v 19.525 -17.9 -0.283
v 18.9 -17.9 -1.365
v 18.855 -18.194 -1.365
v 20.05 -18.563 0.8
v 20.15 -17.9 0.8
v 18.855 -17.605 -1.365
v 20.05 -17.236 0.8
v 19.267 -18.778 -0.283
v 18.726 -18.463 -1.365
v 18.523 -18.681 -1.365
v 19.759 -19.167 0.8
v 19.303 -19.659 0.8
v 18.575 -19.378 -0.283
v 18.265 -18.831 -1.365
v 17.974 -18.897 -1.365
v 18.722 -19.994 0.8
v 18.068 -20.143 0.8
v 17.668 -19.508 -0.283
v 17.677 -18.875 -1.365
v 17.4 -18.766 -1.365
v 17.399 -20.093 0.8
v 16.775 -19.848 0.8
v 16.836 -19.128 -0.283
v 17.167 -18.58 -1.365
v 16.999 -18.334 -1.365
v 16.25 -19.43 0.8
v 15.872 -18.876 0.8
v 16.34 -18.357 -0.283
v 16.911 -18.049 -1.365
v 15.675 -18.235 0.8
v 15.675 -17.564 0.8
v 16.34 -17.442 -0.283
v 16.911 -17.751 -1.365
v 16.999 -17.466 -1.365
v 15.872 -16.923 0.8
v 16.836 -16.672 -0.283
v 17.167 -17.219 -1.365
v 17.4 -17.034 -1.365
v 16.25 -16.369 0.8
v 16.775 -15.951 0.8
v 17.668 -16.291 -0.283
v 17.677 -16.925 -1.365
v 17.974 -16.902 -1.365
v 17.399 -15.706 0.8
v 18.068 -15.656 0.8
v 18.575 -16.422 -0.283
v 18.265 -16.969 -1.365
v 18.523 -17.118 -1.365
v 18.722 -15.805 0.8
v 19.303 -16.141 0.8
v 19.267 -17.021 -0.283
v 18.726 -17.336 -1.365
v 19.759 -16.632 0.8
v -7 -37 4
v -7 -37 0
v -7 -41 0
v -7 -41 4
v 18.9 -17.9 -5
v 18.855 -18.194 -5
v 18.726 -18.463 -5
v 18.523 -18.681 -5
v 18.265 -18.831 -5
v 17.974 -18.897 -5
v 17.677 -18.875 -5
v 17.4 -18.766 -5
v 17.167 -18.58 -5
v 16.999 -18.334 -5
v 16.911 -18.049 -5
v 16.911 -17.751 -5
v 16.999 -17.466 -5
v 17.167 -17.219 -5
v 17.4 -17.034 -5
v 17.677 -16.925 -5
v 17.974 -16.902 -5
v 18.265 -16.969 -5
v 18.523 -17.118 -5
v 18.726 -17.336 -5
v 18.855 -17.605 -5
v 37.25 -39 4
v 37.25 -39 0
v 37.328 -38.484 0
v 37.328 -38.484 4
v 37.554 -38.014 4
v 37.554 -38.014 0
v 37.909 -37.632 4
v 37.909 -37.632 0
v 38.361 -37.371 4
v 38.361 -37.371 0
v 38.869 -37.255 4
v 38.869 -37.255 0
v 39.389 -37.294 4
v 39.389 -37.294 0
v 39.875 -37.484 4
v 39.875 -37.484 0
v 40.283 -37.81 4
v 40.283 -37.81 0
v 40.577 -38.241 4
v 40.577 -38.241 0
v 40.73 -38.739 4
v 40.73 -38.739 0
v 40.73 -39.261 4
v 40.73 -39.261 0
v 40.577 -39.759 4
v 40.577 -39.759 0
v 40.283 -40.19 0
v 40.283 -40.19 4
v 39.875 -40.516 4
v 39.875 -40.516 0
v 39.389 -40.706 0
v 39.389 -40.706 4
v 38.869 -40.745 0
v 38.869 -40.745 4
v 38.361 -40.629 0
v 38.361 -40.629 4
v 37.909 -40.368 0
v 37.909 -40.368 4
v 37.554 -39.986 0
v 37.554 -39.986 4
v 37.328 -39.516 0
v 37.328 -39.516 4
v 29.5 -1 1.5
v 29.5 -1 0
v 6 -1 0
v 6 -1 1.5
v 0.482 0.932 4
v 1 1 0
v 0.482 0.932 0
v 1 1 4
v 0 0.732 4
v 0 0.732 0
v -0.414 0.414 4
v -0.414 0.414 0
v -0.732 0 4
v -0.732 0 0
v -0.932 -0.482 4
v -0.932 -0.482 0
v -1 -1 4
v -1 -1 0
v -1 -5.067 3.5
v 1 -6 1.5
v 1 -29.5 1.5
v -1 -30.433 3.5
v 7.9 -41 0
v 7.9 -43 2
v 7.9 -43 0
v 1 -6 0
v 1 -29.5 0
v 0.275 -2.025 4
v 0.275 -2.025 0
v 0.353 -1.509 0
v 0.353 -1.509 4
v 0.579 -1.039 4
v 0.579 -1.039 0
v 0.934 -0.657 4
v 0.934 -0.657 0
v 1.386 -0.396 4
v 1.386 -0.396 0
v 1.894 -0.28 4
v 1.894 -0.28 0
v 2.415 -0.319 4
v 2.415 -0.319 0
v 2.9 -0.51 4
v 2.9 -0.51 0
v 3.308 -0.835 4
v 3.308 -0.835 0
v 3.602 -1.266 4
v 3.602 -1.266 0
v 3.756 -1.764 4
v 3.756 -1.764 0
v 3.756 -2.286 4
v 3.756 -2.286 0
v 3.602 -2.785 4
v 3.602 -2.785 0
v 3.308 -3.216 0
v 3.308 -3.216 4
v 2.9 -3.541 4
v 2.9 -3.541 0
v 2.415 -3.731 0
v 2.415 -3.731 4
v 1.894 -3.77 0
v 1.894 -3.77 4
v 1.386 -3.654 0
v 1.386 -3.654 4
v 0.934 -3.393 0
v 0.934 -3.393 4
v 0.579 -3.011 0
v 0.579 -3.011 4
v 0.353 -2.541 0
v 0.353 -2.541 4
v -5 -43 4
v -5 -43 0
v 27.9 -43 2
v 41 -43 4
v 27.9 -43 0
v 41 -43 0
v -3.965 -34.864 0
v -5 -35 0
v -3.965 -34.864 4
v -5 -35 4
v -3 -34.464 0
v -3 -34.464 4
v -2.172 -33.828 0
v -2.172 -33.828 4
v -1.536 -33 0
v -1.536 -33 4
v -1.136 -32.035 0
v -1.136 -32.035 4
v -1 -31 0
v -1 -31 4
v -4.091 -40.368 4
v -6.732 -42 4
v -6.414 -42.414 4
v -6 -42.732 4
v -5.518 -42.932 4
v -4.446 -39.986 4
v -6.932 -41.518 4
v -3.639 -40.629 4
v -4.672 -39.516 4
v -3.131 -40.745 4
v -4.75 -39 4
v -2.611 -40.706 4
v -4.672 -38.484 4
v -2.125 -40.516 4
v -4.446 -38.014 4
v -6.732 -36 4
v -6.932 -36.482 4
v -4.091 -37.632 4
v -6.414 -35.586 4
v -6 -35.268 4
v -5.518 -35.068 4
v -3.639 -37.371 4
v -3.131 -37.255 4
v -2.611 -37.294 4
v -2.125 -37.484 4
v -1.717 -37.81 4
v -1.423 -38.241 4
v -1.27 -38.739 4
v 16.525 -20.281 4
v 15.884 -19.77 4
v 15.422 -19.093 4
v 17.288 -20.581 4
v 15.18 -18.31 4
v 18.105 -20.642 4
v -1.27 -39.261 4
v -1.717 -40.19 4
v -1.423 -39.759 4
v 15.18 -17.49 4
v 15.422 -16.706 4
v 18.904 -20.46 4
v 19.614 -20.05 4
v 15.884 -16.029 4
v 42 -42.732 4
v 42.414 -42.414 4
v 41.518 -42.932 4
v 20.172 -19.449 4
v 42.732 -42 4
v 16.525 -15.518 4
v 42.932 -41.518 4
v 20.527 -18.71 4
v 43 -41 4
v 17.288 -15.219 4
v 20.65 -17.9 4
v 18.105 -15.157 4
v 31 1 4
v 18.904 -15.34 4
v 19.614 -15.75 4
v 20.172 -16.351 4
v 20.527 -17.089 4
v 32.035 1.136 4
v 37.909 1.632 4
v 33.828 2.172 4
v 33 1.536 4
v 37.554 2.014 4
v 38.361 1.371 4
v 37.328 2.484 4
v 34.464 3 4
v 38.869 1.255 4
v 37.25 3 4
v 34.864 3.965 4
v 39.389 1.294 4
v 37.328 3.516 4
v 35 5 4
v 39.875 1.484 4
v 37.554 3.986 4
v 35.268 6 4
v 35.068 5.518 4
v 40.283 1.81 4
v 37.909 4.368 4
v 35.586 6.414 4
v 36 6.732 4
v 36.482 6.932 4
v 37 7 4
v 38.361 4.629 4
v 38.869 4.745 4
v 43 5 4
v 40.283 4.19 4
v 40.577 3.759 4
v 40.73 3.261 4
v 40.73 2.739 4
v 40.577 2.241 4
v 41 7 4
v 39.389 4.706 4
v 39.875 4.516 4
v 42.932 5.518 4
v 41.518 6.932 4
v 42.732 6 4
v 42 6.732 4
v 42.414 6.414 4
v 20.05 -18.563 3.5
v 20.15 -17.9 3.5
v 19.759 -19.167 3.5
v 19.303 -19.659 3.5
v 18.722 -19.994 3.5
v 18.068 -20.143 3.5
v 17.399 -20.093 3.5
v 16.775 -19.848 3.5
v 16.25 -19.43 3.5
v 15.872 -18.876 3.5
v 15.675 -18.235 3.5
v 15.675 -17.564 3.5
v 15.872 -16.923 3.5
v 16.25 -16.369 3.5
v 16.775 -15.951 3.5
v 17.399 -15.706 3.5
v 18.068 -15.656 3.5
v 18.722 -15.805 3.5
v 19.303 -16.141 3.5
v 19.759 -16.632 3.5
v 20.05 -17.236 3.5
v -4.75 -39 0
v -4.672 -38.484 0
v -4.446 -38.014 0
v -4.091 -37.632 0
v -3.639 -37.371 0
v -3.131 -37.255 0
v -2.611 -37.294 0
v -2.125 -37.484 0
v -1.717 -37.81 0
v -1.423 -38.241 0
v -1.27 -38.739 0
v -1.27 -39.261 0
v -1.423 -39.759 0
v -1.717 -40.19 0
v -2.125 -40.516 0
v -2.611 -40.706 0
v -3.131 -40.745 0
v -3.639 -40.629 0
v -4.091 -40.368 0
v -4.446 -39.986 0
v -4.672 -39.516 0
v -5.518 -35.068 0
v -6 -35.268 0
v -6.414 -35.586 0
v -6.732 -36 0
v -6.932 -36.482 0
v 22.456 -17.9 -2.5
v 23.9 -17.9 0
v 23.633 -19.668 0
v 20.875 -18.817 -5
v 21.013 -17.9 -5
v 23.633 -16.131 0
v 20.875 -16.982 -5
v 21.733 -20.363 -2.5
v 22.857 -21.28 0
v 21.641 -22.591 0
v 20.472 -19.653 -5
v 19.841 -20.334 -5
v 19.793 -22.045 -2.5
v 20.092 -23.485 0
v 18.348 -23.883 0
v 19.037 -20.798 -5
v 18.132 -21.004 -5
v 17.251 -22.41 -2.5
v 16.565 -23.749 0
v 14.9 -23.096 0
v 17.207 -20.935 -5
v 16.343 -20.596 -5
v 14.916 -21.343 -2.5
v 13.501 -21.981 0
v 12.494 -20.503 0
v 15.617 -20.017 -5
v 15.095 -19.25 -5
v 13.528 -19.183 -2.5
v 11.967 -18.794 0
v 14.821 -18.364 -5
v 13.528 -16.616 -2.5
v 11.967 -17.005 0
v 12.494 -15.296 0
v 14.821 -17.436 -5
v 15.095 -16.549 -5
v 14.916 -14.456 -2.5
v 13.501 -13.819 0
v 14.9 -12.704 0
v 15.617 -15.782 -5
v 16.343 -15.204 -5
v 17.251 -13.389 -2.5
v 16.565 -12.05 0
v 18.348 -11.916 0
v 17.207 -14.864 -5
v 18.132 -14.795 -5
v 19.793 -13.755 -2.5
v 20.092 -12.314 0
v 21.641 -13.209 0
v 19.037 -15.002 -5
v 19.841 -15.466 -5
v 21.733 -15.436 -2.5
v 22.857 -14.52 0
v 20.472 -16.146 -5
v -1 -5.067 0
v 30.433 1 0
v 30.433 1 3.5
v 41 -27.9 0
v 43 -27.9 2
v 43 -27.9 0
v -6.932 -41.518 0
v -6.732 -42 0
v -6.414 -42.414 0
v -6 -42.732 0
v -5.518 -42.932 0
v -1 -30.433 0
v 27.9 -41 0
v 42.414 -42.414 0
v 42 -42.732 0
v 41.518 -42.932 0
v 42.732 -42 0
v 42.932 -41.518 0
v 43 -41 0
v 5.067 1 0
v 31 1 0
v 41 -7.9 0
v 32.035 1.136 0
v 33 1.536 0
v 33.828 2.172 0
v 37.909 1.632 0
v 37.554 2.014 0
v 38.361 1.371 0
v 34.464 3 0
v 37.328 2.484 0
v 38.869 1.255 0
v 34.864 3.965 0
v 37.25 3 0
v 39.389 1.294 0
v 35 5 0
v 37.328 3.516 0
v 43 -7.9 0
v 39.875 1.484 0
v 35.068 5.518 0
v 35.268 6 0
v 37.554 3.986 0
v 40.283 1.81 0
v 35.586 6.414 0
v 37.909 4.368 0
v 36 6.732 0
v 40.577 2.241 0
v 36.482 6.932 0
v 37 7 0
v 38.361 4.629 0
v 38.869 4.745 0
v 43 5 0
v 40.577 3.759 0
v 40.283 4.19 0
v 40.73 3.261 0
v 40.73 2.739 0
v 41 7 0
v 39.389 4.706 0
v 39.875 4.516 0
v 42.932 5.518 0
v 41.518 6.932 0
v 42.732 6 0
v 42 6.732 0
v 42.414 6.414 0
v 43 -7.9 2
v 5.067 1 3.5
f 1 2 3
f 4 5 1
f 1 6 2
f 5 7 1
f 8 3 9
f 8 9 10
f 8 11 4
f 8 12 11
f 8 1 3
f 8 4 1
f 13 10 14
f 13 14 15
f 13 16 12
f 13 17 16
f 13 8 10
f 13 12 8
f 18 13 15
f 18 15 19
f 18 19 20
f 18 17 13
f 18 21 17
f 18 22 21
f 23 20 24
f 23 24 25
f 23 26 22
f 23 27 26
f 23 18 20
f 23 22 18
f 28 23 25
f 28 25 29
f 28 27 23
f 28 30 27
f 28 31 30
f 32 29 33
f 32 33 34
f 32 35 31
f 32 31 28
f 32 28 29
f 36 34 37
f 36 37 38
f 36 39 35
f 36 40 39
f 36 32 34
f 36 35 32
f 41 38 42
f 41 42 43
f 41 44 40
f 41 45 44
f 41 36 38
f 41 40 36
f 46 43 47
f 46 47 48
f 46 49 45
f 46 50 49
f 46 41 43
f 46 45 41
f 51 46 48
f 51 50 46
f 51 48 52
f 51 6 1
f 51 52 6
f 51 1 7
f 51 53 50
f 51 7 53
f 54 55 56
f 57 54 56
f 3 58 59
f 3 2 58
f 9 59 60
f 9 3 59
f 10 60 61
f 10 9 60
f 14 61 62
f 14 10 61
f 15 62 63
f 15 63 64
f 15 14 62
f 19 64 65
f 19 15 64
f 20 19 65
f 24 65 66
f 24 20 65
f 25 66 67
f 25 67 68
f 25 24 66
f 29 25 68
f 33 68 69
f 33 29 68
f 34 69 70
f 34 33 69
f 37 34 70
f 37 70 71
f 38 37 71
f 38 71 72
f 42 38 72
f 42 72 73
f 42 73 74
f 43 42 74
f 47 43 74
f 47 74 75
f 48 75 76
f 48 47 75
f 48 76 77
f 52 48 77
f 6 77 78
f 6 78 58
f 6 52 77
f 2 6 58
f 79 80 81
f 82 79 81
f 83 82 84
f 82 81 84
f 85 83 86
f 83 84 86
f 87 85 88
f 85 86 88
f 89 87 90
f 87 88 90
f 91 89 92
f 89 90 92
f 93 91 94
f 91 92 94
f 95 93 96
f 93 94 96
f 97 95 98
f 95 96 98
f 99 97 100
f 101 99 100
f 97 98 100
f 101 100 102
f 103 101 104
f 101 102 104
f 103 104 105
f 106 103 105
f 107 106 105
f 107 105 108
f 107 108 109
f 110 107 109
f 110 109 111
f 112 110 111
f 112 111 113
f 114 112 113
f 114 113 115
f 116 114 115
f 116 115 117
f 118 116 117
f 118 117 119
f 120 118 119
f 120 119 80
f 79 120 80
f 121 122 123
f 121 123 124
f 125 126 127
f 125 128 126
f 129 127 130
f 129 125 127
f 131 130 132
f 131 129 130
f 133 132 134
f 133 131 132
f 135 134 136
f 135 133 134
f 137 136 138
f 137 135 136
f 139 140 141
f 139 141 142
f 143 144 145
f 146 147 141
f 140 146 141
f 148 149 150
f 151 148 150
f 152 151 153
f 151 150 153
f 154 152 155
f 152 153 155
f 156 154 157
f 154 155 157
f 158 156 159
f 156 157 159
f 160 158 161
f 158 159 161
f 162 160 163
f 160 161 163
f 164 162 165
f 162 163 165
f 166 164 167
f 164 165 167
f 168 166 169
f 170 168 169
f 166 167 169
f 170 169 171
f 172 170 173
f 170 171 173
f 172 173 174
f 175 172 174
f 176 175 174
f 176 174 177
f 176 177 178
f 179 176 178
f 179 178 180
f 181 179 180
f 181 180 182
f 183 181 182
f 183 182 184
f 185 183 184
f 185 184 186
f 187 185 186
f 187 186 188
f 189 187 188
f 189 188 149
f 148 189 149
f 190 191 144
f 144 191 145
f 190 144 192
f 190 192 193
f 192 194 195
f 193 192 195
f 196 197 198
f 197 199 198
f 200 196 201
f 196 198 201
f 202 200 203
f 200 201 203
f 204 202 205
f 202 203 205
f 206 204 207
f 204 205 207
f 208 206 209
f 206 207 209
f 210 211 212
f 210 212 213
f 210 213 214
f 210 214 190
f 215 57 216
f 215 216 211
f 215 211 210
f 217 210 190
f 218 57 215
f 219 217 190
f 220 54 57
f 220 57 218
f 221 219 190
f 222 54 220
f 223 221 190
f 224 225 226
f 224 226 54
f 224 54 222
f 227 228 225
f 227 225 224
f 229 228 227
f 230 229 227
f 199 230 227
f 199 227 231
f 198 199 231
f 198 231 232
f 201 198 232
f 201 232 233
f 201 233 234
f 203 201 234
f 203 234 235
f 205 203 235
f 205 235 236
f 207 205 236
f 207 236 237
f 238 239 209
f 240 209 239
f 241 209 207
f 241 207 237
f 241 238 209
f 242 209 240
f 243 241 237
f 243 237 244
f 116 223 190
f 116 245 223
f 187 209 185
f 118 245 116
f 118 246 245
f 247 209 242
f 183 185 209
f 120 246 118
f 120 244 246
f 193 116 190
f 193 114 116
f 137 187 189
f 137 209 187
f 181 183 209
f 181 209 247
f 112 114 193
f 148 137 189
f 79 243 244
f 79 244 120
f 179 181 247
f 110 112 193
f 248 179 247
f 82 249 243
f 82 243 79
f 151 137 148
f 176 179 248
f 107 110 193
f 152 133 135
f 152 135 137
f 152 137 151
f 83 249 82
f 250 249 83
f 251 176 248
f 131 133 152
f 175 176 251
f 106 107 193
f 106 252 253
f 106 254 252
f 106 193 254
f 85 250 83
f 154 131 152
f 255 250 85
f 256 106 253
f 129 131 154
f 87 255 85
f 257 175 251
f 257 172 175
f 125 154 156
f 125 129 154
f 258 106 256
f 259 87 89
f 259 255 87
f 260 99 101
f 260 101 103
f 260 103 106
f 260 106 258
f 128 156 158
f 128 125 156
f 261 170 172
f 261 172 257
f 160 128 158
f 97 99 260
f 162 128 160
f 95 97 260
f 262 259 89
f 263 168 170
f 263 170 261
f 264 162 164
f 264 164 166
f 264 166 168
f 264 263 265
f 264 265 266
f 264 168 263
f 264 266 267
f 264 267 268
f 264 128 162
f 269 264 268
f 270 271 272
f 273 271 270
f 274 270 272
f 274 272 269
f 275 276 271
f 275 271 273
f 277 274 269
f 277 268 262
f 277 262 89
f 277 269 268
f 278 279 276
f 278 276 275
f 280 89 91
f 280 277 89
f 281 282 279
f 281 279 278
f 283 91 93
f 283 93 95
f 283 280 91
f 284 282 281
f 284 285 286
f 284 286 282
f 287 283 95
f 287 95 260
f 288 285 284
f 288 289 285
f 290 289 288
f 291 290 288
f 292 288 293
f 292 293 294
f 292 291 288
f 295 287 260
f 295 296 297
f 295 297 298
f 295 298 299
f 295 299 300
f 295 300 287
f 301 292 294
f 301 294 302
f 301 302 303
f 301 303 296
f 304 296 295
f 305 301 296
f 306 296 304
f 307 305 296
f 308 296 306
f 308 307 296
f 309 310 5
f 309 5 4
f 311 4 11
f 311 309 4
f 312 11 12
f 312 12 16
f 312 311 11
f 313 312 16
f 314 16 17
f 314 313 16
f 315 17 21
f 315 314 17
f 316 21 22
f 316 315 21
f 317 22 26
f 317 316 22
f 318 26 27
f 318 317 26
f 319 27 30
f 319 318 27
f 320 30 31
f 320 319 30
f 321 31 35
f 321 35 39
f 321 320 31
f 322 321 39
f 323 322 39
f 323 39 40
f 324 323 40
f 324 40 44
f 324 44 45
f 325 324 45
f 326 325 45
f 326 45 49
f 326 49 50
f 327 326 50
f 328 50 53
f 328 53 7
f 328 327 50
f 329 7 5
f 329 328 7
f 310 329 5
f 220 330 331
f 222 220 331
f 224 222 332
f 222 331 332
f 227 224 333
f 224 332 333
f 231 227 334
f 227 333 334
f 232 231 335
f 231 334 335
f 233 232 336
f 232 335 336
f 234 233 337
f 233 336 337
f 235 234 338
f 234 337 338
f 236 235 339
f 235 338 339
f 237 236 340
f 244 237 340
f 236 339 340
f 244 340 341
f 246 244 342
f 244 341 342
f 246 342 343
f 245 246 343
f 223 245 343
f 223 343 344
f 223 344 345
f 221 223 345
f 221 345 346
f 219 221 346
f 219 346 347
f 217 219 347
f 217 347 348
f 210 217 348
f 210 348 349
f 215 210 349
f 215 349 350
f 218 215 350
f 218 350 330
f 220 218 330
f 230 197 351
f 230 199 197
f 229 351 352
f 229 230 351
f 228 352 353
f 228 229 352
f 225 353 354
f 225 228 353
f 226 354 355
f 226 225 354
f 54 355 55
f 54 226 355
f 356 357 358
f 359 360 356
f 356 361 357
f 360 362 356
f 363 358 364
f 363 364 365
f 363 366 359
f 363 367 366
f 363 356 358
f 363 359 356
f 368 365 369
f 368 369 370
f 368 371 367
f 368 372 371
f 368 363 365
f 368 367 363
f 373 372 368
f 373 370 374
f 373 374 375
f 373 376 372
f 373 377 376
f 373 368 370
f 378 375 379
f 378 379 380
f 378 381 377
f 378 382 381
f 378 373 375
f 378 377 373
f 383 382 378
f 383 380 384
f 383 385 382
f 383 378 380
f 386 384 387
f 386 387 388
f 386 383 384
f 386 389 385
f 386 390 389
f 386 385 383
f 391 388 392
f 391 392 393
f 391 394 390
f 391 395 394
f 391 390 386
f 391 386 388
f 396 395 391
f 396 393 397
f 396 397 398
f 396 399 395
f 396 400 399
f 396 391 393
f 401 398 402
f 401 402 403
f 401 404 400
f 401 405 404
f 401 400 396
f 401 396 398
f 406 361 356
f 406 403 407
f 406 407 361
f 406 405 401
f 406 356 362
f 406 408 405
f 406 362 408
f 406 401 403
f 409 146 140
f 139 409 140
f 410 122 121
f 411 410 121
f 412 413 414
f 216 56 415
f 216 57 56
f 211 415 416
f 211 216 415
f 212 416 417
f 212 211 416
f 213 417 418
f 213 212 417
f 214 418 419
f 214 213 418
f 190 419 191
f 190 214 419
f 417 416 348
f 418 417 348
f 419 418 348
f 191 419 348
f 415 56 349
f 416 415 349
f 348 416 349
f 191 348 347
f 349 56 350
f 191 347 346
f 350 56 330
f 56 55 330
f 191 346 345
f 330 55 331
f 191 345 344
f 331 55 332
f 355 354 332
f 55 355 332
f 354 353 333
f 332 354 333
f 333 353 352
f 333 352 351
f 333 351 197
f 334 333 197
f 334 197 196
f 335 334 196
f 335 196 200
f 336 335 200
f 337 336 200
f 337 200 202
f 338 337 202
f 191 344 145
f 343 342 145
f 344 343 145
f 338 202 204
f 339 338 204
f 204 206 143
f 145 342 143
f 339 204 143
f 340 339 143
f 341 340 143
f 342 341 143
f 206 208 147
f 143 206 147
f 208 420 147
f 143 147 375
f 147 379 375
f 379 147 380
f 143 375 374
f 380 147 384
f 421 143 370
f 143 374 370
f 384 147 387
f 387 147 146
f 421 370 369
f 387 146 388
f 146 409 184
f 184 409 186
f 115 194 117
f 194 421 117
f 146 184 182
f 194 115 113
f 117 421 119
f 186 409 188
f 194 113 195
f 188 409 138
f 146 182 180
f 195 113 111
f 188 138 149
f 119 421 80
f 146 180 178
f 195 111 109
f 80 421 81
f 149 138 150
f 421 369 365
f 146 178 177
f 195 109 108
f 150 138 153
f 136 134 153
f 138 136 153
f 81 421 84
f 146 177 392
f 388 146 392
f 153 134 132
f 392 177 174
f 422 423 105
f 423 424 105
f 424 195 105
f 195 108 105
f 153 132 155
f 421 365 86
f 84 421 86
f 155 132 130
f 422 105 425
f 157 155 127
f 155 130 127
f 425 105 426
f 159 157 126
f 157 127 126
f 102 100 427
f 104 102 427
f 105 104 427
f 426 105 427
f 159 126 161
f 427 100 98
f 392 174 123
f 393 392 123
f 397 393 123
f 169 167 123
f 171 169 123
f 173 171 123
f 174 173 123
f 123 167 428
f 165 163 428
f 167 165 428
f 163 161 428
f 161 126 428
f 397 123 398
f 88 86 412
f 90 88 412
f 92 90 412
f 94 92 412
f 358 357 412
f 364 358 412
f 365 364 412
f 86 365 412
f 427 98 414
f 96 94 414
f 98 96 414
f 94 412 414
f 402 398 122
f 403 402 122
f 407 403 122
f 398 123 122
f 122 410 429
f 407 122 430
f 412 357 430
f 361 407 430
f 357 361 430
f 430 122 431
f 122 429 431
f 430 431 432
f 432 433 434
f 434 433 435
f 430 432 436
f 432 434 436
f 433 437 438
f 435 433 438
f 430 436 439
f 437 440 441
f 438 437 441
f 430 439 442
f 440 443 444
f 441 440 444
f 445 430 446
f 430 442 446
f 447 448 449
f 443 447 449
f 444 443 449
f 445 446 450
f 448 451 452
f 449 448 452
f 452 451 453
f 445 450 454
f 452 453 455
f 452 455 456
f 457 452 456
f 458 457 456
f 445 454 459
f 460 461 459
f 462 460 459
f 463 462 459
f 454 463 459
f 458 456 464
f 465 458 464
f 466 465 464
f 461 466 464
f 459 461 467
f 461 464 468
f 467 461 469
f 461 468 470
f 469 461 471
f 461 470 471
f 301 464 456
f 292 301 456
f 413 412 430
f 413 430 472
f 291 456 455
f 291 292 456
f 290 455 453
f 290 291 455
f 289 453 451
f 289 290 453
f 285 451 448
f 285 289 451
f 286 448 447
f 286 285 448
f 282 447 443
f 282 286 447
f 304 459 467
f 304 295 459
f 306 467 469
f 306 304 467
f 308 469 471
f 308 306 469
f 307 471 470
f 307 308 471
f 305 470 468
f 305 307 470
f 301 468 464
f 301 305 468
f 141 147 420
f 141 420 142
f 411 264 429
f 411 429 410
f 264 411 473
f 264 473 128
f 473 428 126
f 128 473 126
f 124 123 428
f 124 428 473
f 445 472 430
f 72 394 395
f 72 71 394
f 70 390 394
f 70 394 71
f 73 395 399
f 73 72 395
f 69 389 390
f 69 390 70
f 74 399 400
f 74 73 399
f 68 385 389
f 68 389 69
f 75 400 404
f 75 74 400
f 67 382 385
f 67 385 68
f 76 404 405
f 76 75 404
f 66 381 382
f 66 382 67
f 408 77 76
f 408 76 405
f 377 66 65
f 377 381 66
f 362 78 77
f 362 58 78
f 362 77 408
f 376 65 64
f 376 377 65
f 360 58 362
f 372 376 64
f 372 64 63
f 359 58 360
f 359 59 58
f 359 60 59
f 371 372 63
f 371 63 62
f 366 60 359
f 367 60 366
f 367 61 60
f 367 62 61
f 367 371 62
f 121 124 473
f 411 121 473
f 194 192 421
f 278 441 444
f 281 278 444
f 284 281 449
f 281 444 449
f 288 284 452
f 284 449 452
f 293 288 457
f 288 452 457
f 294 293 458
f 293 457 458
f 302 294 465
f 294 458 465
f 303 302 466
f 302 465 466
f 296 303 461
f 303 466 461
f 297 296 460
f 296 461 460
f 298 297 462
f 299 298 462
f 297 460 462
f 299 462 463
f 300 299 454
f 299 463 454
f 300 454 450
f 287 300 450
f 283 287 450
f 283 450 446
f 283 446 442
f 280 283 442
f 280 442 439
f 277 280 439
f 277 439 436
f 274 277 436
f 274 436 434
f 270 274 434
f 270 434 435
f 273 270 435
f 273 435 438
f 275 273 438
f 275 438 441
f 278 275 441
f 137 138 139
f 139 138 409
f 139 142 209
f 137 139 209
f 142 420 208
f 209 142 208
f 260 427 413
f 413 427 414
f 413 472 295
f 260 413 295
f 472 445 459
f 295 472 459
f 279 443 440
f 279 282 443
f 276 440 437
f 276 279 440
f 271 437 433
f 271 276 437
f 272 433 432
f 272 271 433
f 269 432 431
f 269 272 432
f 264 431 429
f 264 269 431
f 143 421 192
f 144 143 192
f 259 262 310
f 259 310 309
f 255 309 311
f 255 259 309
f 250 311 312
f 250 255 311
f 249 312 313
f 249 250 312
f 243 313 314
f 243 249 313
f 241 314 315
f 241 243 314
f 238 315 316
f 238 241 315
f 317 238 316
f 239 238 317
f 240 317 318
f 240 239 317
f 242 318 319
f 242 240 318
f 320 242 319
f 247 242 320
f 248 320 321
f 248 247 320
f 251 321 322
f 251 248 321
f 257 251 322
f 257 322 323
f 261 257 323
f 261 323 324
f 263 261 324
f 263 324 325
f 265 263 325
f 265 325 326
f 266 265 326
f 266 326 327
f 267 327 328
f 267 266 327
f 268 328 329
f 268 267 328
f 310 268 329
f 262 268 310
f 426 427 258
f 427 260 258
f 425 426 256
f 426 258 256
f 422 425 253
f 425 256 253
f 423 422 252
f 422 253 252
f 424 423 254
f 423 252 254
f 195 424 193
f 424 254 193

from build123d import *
from OCP.BRepFilletAPI import BRepFilletAPI_MakeChamfer

# Parameters (mm, degrees)
BOSS_EXTRUDE1_DEPTH        = 4
FILLET1_R                  = 2
FILLET2_R                  = 4
SKETCH3_R                  = 6
CUT_EXTRUDE3_DEPTH         = 61.942595941
SKETCH4_R                  = 1.75
CUT_EXTRUDE6_DEPTH         = 61.942595941
CUT_EXTRUDE7_DEPTH         = 10
CUT_EXTRUDE8_START         = -12.533
CUT_EXTRUDE8_DEPTH         = 25.3653
CHAMFER1_SIZE              = 2
CHAMFER1_SIZE_2            = 0.932615316
CHAMFER1_OF_MIRROR1_SIZE   = 0.932615316
CHAMFER1_OF_MIRROR1_SIZE_2 = 2
CHAMFER2_SIZE              = 0.5


with BuildPart() as part:
    # Sketch1 → Boss-Extrude1 (new body)
    with BuildSketch(Plane.XY):
        Polygon((43, -43), (43, 7), (35, 7), (35, 1), (-1, 1), (-1, -35), (-7, -35), (-7, -43), align=None)
    extrude(amount=BOSS_EXTRUDE1_DEPTH)

    # Fillet1
    fillet1_edges = [part.edges().sort_by_distance(p)[0] for p in [
        (-7, -43, 2),
        (-7, -35, 2),
        (-1, 1, 2),
        (35, 7, 2),
        (43, 7, 2),
        (43, -43, 2),
    ]]
    fillet(fillet1_edges, radius=FILLET1_R)

    # Fillet2
    fillet2_edges = [part.edges().sort_by_distance(p)[0] for p in [
        (35, 1, 2),
        (-1, -35, 2),
    ]]
    fillet(fillet2_edges, radius=FILLET2_R - 0.0001)  # a hair under: the kernel refuses the full size

    # Sketch3 → Cut-Extrude3 (cut, through all)
    with BuildSketch(Plane(origin=(0, 0, 0), x_dir=(-1, 0, 0), z_dir=(0, 0, -1))):
        with Locations((-17.899660586, -17.899660586)):
            Circle(SKETCH3_R)
    extrude(amount=-CUT_EXTRUDE3_DEPTH, mode=Mode.SUBTRACT)

    # Sketch4 → Cut-Extrude6 (cut, through all)
    with BuildSketch(Plane(origin=(0, 0, 0), x_dir=(-1, 0, 0), z_dir=(0, 0, -1))):
        with Locations((-39, 3)):
            Circle(SKETCH4_R)
        with Locations((-39, -39)):
            Circle(SKETCH4_R)
        with Locations((3, -39)):
            Circle(SKETCH4_R)
        with Locations((-2.025269256, -2.025269256)):
            Circle(SKETCH4_R)
    extrude(amount=-CUT_EXTRUDE6_DEPTH, mode=Mode.SUBTRACT)

    # Sketch5 → Cut-Extrude7 (cut, symmetric)
    with BuildSketch(Plane.ZY.offset(-17.899660586)):
        Polygon((2, -43), (0, -43), (0, -41), align=None)
    cut_extrude7 = extrude(amount=CUT_EXTRUDE7_DEPTH, both=True, mode=Mode.SUBTRACT)

    # Sketch6 → Cut-Extrude8 (cut)
    with BuildSketch(Plane.ZY.offset(-17.899660586).offset(CUT_EXTRUDE8_START)):
        Polygon((0, 1), (0, -1), (1.5, -1), (3.5, 1), align=None)
    cut_extrude8 = extrude(amount=CUT_EXTRUDE8_DEPTH, mode=Mode.SUBTRACT)

    # Chamfer1
    chamfer1_edges_1 = [part.edges().sort_by_distance(p)[0] for p in [
        (5.067360586, -1, 0.75),
    ]]
    chamfer1_side_1 = [part.faces().sort_by_distance(p)[0] for p in [
        (5.067360586, -0.981347694, 0.75),
    ]]
    chamfer1_edges_2 = [part.edges().sort_by_distance(p)[0] for p in [
        (30.432660586, -1, 0.75),
    ]]
    chamfer1_side_2 = [part.faces().sort_by_distance(p)[0] for p in [
        (30.41400828, -1, 0.75),
    ]]
    chamfer1 = BRepFilletAPI_MakeChamfer(part.part.solid().wrapped)
    for e in chamfer1_edges_1:
        chamfer1.Add(CHAMFER1_SIZE - 0.0001, CHAMFER1_SIZE_2 - 0.0001, e.wrapped, chamfer1_side_1[0].wrapped)
    for e in chamfer1_edges_2:
        chamfer1.Add(CHAMFER1_SIZE_2 - 0.0001, CHAMFER1_SIZE - 0.0001, e.wrapped, chamfer1_side_2[0].wrapped)
    add(Compound.cast(chamfer1.Shape()), mode=Mode.REPLACE)  # a hair under: the kernel refuses the full size

    # Mirror1: Cut-Extrude7, Cut-Extrude8 across plane
    add(cut_extrude7.mirror(Plane(origin=(0, 0, 0), x_dir=(0, 0, 1), z_dir=(-0.7071067811865479, -0.7071067811865472, 0))), mode=Mode.SUBTRACT)
    add(cut_extrude8.mirror(Plane(origin=(0, 0, 0), x_dir=(0, 0, 1), z_dir=(-0.7071067811865479, -0.7071067811865472, 0))), mode=Mode.SUBTRACT)

    # Chamfer1 of Mirror1
    chamfer1_of_mirror1_edges_1 = [part.edges().sort_by_distance(p)[0] for p in [
        (1, -5.067360586, 0.75),
    ]]
    chamfer1_of_mirror1_side_1 = [part.faces().sort_by_distance(p)[0] for p in [
        (1, -5.086012893, 0.75),
    ]]
    chamfer1_of_mirror1_edges_2 = [part.edges().sort_by_distance(p)[0] for p in [
        (1, -30.432660586, 0.75),
    ]]
    chamfer1_of_mirror1_side_2 = [part.faces().sort_by_distance(p)[0] for p in [
        (0.981347694, -30.432660586, 0.75),
    ]]
    chamfer1_of_mirror1 = BRepFilletAPI_MakeChamfer(part.part.solid().wrapped)
    for e in chamfer1_of_mirror1_edges_1:
        chamfer1_of_mirror1.Add(CHAMFER1_OF_MIRROR1_SIZE - 0.0001, CHAMFER1_OF_MIRROR1_SIZE_2 - 0.0001, e.wrapped, chamfer1_of_mirror1_side_1[0].wrapped)
    for e in chamfer1_of_mirror1_edges_2:
        chamfer1_of_mirror1.Add(CHAMFER1_OF_MIRROR1_SIZE_2 - 0.0001, CHAMFER1_OF_MIRROR1_SIZE - 0.0001, e.wrapped, chamfer1_of_mirror1_side_2[0].wrapped)
    add(Compound.cast(chamfer1_of_mirror1.Shape()), mode=Mode.REPLACE)  # a hair under: the kernel refuses the full size

    # Sketch7 → Revolve1 (revolve)
    with BuildSketch(Plane(origin=(0, -17.899660586, 0), x_dir=(0, 0, -1), z_dir=(0, -1, 0))):
        Polygon((0, 23.899660586), (5, 21.01290924), (5, 18.899660586), (1.365063509, 18.899660586), (-0.8, 20.149660586), (-4, 20.149660586), (-4, 23.899660586), align=None)
    revolve(axis=Axis((17.899660586, -17.899660586, 0), (0, 0, -1)))

    # Chamfer2
    chamfer2_edges = [part.edges().sort_by_distance(p)[0] for p in [
        (15.649660586, -17.899660586, 4),
    ]]
    chamfer(chamfer2_edges, length=CHAMFER2_SIZE)


solid = part.part
